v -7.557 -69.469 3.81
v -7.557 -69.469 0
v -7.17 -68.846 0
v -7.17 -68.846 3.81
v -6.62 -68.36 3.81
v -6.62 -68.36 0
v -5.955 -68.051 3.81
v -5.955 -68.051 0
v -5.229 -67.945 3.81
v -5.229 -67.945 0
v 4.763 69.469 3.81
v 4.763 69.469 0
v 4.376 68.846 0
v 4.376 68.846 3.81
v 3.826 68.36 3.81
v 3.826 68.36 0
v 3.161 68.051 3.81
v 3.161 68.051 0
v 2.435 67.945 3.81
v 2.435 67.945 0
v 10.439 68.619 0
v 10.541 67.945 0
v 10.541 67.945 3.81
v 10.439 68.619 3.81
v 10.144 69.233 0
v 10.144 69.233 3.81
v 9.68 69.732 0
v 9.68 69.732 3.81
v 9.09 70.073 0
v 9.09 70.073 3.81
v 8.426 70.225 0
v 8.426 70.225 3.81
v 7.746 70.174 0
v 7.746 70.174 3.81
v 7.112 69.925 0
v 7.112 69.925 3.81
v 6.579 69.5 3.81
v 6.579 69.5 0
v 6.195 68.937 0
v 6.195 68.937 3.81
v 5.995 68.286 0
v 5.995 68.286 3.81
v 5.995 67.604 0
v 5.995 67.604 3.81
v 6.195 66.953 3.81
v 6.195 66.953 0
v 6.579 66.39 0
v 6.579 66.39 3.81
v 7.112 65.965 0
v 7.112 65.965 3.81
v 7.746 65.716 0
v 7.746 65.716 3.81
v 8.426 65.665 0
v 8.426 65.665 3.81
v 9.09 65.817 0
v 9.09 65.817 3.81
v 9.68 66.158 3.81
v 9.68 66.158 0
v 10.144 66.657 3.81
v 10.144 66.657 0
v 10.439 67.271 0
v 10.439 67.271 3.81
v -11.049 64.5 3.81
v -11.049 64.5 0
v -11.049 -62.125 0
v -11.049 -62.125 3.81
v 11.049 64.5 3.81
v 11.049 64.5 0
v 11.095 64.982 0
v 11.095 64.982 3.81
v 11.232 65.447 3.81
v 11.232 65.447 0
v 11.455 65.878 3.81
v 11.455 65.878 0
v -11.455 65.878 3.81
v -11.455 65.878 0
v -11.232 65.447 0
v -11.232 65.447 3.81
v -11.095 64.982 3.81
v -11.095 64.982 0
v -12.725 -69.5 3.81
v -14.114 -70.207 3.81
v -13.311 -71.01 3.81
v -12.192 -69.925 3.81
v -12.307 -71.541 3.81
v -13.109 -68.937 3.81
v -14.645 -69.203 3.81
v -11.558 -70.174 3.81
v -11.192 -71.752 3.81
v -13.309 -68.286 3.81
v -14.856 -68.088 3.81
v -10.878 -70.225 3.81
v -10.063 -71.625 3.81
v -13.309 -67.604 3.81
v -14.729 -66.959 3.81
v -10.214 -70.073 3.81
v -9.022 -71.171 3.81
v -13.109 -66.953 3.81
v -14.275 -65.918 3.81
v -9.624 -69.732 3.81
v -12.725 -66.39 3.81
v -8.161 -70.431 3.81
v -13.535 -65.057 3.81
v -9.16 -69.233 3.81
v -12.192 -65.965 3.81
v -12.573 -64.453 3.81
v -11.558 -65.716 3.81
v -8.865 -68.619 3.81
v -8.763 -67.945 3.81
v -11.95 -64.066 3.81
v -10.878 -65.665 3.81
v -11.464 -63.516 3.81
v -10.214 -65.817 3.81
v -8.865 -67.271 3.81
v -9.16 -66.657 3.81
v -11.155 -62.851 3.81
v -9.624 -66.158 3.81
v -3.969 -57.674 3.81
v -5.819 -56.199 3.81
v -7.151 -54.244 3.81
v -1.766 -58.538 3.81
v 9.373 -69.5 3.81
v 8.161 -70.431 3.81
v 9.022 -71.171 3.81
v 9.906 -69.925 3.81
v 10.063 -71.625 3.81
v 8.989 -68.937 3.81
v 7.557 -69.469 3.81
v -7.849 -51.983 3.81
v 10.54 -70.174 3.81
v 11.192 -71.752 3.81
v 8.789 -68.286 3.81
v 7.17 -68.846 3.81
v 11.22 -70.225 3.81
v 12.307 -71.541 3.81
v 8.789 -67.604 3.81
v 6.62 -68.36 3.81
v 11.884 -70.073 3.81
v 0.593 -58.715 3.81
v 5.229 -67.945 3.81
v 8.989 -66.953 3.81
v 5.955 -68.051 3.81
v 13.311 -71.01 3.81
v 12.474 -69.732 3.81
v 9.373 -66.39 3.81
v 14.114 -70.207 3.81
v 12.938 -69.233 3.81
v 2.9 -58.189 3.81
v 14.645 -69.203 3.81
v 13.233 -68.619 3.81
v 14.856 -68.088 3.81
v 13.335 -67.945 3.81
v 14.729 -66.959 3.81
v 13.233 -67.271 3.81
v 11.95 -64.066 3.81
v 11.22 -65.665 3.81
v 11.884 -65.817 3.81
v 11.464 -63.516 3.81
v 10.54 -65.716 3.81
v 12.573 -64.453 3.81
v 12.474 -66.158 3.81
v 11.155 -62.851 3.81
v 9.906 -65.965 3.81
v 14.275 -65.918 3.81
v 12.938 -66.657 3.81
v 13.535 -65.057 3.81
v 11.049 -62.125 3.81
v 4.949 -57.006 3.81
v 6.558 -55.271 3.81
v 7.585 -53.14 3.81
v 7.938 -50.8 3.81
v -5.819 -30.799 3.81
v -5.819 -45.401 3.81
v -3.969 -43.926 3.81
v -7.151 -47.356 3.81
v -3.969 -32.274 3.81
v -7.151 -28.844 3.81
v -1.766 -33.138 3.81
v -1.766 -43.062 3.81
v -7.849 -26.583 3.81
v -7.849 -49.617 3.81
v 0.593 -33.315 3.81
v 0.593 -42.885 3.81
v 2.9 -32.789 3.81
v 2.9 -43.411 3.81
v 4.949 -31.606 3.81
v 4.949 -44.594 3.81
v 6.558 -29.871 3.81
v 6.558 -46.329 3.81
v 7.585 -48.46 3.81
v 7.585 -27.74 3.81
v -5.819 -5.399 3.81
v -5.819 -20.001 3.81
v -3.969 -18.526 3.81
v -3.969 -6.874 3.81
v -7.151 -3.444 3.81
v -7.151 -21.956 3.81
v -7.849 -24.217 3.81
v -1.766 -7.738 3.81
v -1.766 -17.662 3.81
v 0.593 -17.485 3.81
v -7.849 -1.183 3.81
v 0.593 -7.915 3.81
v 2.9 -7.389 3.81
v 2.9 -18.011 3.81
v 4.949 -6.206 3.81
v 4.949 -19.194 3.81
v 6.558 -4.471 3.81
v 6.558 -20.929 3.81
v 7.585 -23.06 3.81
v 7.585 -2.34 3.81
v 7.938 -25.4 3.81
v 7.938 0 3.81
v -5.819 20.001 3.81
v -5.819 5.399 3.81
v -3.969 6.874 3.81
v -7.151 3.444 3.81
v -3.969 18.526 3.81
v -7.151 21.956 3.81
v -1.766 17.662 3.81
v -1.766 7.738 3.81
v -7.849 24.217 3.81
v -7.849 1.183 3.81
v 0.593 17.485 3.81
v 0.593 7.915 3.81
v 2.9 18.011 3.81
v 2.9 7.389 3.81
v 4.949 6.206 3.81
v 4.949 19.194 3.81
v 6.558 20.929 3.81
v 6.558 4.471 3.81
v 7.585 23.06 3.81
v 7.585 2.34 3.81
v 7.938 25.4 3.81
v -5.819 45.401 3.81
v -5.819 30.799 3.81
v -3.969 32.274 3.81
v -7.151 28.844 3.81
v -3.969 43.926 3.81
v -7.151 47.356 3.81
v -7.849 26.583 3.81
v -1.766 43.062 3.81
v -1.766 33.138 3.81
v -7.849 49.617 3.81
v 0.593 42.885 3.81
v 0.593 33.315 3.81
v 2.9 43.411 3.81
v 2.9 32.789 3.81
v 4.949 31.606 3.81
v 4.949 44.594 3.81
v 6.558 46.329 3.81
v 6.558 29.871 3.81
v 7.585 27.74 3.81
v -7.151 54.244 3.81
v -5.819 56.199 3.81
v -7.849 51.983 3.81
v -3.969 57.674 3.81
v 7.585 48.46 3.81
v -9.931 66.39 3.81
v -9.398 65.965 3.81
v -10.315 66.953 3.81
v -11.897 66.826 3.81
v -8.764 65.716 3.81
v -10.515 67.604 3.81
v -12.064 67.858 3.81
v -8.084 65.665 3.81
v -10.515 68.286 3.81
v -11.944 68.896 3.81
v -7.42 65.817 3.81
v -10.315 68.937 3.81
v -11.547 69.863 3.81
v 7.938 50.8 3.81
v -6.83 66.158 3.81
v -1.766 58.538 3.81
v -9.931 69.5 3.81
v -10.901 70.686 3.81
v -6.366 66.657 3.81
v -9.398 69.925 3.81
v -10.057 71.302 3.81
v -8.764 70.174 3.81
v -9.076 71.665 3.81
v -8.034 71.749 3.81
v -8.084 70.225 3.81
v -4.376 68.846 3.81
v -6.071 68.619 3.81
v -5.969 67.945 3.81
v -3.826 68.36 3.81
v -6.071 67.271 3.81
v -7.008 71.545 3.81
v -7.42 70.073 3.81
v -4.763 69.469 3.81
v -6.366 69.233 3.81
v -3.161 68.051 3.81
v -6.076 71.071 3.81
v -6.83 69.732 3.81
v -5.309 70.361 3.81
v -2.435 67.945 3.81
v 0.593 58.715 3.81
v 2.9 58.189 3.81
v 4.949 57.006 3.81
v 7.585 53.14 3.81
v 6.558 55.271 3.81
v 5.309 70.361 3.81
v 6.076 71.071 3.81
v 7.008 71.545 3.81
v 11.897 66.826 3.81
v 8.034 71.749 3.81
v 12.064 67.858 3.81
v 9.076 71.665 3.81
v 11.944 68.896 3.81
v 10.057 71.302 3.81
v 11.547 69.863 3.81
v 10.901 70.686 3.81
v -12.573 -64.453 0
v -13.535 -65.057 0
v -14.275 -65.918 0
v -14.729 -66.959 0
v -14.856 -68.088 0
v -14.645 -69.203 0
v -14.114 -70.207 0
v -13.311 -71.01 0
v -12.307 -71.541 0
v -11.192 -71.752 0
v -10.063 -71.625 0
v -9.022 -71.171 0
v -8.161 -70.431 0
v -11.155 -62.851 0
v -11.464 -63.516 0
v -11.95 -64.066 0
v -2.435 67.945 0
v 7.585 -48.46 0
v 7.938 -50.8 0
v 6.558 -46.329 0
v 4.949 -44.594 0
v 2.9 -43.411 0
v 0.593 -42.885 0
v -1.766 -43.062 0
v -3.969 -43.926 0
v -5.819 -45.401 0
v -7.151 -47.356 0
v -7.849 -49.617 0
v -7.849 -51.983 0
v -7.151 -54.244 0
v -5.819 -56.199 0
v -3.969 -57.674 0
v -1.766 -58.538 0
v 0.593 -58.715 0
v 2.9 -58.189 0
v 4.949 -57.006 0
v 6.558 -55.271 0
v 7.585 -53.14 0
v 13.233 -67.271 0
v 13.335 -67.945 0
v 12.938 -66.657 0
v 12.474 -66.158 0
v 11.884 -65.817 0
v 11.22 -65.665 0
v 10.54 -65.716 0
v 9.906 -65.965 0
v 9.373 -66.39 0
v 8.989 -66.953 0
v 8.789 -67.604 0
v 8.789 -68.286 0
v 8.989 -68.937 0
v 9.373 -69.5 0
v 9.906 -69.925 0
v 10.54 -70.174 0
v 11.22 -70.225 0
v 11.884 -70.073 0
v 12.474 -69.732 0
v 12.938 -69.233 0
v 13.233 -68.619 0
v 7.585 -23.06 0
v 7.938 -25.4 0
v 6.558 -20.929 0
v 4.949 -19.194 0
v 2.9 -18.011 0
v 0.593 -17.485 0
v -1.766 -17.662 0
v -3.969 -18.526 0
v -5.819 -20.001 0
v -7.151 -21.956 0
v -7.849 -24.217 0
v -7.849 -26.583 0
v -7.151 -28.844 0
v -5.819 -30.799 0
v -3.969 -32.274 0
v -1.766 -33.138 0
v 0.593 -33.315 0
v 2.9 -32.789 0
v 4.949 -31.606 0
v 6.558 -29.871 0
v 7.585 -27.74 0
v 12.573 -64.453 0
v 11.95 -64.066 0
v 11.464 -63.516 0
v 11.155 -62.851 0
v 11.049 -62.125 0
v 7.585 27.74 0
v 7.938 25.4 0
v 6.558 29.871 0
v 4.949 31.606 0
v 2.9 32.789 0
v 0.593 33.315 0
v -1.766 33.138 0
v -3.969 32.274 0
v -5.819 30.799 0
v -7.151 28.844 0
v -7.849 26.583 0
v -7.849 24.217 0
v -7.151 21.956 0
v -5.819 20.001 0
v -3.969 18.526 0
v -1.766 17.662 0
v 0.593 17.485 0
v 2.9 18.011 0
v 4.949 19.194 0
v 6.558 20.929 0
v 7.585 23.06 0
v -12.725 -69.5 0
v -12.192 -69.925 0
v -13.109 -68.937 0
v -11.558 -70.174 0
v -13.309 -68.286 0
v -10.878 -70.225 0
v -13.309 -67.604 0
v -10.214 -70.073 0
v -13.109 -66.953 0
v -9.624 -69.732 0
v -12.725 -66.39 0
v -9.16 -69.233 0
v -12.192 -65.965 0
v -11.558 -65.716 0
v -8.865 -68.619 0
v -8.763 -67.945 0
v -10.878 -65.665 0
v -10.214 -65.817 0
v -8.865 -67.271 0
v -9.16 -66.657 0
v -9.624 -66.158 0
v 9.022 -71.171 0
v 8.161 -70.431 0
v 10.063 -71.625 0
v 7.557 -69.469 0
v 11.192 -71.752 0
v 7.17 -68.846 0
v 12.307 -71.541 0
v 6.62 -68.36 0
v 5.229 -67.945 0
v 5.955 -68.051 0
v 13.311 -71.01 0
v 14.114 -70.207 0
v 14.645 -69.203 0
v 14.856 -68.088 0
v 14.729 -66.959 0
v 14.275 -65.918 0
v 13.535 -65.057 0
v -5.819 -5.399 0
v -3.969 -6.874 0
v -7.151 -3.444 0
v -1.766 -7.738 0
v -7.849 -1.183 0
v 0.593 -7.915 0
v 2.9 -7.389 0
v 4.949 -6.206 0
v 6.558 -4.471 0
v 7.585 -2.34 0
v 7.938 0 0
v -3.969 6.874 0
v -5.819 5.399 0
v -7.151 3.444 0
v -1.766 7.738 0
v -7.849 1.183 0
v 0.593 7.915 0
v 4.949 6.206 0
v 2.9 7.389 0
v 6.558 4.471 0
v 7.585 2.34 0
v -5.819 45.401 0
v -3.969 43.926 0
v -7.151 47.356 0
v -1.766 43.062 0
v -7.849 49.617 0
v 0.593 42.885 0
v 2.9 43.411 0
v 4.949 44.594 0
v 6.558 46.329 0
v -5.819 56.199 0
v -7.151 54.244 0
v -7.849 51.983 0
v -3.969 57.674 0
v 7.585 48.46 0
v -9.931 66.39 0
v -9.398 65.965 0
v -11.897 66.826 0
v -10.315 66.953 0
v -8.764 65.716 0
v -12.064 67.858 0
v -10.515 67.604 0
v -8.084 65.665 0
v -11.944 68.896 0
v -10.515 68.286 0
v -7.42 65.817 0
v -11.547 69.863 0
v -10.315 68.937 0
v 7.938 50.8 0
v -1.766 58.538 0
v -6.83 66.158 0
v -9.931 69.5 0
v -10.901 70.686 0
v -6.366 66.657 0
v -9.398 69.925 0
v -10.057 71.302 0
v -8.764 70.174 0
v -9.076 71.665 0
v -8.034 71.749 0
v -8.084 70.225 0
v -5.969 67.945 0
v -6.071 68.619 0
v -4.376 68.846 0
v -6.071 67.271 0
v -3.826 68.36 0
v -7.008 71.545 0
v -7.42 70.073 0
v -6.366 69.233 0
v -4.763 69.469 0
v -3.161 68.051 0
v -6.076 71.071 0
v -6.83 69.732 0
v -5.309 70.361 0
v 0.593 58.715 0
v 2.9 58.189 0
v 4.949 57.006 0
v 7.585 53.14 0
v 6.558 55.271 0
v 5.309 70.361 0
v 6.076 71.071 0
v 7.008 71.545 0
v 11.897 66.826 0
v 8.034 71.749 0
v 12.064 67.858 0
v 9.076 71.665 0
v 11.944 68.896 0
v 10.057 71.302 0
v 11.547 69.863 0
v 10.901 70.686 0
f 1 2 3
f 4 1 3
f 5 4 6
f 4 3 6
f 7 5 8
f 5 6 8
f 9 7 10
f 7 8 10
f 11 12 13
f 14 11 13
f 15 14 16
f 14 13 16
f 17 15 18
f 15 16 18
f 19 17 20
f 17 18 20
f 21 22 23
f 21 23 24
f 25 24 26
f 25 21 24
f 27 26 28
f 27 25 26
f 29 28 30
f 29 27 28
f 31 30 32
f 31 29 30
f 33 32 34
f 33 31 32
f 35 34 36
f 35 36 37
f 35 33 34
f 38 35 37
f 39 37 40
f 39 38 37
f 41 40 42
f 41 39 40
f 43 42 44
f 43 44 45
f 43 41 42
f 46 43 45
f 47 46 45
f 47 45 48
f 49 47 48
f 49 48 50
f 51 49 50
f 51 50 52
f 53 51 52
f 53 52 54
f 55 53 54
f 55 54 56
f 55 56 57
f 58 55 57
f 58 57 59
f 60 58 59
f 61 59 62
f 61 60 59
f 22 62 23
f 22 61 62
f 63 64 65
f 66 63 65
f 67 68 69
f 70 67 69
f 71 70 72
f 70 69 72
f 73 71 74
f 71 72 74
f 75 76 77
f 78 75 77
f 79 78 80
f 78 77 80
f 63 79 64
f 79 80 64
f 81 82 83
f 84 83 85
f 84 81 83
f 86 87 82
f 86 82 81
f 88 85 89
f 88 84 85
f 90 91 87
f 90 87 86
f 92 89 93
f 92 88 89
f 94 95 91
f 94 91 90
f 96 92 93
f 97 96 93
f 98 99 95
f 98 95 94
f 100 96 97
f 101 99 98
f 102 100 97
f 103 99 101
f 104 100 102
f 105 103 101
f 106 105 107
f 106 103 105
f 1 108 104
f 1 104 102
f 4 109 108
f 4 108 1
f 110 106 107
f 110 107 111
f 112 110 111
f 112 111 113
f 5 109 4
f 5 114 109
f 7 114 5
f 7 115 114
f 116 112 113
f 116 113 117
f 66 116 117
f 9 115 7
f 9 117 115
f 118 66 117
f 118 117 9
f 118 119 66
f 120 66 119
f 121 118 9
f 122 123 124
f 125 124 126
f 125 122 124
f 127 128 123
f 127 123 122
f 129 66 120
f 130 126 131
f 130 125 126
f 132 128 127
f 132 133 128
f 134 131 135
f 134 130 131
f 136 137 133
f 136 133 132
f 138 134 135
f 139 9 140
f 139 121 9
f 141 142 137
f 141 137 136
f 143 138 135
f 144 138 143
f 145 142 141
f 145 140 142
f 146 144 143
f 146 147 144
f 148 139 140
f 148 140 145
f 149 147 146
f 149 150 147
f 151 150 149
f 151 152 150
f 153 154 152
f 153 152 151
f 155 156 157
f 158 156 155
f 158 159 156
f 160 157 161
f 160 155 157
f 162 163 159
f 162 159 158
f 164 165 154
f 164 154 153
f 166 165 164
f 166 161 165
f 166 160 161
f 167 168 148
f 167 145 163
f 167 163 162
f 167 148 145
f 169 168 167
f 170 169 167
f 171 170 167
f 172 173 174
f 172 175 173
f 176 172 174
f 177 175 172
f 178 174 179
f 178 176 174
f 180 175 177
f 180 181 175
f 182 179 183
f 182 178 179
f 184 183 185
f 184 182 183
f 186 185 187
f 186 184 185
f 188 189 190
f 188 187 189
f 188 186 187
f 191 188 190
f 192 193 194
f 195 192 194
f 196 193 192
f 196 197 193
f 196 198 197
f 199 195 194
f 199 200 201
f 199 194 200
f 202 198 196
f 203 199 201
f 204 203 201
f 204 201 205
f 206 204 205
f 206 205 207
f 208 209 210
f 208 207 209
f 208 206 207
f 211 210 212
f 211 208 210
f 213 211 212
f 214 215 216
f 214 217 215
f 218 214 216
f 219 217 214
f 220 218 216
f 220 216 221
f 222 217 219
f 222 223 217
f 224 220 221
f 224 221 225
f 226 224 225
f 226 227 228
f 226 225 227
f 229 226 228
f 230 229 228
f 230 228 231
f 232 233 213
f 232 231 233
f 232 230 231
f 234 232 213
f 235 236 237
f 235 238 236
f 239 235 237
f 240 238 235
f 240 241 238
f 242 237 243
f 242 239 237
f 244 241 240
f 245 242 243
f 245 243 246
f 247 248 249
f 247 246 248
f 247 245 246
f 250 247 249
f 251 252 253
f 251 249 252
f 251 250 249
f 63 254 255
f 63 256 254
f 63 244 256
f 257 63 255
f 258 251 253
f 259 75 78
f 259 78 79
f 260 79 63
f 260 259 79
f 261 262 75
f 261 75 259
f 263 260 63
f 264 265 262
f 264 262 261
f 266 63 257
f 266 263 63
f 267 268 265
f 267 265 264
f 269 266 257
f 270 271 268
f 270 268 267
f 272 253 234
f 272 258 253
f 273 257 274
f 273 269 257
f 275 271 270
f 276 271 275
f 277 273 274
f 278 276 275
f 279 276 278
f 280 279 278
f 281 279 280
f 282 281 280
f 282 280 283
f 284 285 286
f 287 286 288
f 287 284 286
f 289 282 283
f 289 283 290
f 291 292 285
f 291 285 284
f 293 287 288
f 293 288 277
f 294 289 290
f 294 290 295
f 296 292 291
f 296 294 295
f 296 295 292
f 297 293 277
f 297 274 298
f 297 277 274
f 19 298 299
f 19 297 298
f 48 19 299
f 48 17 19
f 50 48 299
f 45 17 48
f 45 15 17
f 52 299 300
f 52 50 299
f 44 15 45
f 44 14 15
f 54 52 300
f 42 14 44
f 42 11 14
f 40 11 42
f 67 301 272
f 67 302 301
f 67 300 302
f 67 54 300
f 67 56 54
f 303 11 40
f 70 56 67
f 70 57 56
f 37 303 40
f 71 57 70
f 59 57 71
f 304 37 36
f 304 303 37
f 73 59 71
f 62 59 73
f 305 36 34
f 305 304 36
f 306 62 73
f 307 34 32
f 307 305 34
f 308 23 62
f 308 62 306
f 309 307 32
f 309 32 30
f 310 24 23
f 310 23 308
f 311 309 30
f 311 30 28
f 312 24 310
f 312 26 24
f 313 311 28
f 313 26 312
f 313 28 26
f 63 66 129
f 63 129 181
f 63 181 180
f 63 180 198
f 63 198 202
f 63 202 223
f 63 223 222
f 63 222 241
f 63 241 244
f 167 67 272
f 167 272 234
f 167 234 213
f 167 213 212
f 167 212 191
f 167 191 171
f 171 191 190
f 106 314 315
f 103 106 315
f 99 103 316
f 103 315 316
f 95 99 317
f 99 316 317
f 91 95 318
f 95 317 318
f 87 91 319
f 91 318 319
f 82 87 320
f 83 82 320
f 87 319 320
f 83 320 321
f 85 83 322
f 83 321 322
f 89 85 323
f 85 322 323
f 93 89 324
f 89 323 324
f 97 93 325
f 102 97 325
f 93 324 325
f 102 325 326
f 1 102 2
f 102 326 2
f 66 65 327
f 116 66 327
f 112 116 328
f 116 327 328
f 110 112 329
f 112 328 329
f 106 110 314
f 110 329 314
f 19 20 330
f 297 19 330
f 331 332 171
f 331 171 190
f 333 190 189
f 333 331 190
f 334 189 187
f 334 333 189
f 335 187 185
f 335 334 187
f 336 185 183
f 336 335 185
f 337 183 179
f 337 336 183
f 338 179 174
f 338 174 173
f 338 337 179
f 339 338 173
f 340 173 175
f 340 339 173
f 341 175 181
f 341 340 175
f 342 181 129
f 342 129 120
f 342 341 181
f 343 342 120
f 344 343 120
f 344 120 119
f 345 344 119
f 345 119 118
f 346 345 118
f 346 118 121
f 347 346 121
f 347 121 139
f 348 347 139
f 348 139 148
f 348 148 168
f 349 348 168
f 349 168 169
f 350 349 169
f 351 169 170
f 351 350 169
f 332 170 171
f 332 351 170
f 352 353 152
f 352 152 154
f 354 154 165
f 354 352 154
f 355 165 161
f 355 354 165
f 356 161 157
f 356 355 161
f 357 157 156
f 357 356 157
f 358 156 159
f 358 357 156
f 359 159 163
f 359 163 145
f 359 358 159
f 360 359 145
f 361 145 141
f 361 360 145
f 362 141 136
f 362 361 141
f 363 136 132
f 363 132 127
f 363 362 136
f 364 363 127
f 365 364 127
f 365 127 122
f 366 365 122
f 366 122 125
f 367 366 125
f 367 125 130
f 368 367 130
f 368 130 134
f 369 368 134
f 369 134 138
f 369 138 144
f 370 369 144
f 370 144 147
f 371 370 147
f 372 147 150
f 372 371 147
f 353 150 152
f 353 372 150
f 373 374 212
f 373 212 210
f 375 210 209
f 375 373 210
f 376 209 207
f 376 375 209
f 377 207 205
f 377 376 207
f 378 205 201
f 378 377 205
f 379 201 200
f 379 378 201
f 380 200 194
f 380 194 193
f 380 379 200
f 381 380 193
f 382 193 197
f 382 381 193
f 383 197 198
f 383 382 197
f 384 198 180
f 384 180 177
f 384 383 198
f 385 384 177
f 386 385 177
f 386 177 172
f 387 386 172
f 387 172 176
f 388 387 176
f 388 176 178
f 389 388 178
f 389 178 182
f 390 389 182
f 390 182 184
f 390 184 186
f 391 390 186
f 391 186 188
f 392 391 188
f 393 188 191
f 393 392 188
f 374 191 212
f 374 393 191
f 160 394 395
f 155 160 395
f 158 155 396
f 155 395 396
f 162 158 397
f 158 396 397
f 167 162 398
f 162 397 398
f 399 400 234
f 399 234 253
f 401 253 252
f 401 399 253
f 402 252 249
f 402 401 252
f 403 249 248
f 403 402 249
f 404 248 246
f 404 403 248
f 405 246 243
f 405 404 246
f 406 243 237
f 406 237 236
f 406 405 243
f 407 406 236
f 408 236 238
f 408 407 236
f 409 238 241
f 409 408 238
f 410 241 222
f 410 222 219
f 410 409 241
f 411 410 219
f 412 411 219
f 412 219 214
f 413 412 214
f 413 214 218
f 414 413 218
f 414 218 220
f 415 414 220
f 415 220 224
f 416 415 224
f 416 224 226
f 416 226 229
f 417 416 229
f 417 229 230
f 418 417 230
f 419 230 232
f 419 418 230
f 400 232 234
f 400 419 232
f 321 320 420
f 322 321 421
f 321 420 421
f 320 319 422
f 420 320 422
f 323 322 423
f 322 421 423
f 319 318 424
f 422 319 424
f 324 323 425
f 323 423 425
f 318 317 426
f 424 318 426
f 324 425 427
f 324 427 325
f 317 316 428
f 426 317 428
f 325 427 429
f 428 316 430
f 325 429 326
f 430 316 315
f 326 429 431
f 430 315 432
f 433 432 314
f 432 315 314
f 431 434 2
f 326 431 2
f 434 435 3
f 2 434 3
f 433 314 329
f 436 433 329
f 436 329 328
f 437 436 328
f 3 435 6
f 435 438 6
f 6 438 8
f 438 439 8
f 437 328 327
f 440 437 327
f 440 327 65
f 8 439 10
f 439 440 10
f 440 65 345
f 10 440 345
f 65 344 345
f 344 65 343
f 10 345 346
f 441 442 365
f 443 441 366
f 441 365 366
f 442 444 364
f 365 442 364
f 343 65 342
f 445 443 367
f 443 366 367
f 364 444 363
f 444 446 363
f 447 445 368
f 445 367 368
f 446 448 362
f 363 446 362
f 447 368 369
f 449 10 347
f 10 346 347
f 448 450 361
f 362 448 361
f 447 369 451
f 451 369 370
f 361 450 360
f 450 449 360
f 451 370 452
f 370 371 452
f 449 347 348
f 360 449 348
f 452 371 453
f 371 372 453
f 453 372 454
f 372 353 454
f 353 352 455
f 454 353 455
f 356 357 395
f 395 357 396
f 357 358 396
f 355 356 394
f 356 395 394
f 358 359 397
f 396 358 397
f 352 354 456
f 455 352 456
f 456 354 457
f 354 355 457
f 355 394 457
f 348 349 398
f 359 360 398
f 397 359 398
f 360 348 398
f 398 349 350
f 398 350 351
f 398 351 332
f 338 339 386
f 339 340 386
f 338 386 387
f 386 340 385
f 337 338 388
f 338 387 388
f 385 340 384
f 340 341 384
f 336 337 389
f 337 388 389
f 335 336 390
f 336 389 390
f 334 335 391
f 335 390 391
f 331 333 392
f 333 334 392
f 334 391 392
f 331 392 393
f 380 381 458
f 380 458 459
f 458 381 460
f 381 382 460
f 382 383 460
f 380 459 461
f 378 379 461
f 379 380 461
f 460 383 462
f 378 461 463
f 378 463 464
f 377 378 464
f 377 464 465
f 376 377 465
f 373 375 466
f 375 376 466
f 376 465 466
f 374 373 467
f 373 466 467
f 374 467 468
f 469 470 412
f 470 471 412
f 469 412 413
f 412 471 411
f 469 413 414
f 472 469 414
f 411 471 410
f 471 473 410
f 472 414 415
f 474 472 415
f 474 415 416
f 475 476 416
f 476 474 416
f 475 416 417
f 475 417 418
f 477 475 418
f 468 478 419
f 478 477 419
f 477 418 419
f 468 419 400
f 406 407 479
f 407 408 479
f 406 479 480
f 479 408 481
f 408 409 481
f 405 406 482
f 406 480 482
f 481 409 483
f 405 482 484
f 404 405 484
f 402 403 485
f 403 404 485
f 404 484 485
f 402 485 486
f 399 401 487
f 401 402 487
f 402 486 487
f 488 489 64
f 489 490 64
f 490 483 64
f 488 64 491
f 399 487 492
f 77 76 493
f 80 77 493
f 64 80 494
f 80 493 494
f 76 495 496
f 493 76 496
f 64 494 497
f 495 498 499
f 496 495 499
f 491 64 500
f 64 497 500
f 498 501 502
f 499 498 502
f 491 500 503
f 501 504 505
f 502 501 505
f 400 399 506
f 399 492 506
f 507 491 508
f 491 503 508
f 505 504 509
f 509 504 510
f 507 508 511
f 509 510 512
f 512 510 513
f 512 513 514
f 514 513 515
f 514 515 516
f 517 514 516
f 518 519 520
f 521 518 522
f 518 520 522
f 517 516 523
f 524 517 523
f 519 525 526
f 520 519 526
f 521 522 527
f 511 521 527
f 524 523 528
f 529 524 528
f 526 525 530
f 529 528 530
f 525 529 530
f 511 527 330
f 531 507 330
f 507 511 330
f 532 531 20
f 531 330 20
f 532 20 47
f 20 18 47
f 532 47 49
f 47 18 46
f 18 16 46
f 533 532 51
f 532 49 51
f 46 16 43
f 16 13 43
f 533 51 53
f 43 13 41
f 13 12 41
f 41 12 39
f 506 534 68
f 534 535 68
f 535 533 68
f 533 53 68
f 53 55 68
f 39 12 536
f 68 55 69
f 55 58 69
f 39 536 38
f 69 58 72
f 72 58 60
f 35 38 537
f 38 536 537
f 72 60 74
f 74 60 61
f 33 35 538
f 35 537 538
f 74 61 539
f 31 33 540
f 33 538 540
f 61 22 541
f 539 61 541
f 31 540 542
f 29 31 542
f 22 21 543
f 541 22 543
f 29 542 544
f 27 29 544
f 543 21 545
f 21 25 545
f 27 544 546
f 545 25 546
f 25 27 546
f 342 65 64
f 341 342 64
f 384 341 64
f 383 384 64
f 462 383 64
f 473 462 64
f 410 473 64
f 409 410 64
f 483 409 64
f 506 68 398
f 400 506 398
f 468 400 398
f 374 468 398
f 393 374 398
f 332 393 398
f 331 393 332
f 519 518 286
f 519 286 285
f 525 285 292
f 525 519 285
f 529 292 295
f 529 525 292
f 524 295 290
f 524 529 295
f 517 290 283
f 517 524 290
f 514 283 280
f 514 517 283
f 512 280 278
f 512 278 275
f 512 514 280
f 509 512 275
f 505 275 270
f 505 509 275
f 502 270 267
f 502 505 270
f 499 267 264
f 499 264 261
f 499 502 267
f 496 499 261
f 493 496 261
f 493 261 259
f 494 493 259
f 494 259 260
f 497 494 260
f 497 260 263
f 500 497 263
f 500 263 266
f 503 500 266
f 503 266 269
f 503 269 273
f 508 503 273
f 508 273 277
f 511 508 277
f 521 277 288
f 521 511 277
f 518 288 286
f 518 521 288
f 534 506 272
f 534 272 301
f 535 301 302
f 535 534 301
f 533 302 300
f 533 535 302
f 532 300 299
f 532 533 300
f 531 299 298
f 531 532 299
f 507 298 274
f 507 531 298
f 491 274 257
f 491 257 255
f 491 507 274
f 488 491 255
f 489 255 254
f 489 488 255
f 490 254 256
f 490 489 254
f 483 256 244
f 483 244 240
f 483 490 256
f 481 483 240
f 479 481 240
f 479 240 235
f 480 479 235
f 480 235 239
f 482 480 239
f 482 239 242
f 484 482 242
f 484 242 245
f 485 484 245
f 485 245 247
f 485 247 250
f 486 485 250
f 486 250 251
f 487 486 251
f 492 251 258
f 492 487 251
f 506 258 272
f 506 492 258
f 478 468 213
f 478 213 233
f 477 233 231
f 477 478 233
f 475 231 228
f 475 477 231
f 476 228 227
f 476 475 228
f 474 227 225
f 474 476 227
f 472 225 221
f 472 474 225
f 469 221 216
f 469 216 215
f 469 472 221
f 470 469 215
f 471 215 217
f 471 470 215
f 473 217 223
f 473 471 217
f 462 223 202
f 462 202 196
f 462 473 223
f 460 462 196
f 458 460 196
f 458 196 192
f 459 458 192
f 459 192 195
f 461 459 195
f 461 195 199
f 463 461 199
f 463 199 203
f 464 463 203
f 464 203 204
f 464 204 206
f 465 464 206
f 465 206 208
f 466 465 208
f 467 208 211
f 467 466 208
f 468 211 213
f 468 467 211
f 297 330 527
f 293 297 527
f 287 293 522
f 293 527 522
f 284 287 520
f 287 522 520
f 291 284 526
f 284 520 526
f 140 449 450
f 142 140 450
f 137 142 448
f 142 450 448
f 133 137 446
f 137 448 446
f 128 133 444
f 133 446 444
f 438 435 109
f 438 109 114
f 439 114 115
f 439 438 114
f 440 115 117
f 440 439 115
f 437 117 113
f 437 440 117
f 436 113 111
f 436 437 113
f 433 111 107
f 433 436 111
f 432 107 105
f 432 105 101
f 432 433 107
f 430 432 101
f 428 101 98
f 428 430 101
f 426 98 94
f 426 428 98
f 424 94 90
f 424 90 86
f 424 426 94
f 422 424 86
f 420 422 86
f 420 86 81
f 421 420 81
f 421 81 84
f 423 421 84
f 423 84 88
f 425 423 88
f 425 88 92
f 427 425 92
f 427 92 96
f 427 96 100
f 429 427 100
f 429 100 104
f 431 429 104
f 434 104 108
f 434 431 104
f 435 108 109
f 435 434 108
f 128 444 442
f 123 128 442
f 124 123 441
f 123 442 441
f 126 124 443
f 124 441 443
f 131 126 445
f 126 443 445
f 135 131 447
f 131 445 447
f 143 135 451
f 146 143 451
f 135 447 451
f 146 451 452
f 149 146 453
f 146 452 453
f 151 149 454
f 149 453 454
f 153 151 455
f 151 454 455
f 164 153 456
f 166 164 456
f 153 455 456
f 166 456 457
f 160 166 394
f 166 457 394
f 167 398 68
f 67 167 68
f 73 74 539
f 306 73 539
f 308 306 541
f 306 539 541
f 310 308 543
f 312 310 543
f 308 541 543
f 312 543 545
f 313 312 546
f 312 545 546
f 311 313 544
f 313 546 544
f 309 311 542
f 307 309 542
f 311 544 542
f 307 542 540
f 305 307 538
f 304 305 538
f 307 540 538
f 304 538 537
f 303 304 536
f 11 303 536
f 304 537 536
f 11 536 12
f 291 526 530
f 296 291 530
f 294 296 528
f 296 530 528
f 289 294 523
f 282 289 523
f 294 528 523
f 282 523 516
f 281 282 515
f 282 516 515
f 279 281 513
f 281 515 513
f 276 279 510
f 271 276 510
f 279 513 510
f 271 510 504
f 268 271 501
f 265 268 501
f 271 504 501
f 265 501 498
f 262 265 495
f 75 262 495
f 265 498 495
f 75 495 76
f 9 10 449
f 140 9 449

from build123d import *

# Parameters (mm, degrees)
F0_R     = 2.286
F0_R_2   = 7.9375
F1_DEPTH = 3.81


with BuildPart() as f1:
    # F0 (on Top) → F1 (new body)
    with BuildSketch(Plane.XY):
        with BuildLine():
            Line((2.435129, 67.945), (-2.435129, 67.945))
            ThreePointArc((-2.435129, 67.945), (-3.826344, 68.359884), (-4.763077, 69.469))
            ThreePointArc((-4.763077, 69.469), (-10.056534, 71.302168), (-11.4554, 65.877746))
            ThreePointArc((-11.4554, 65.877746), (-11.152718, 65.217997), (-11.049, 64.499576))
            Line((-11.049, 64.499576), (-11.049, -62.125129))
            ThreePointArc((-11.049, -62.125129), (-11.463884, -63.516344), (-12.573, -64.453077))
            ThreePointArc((-12.573, -64.453077), (-13.743077, -70.639077), (-7.557077, -69.469))
            ThreePointArc((-7.557077, -69.469), (-6.620344, -68.359884), (-5.229129, -67.945))
            Line((-5.229129, -67.945), (5.229129, -67.945))
            ThreePointArc((5.229129, -67.945), (6.620344, -68.359884), (7.557077, -69.469))
            ThreePointArc((7.557077, -69.469), (13.743077, -70.639077), (12.573, -64.453077))
            ThreePointArc((12.573, -64.453077), (11.463884, -63.516344), (11.049, -62.125129))
            Line((11.049, -62.125129), (11.049, 64.499576))
            ThreePointArc((11.049, 64.499576), (11.152718, 65.217997), (11.4554, 65.877746))
            ThreePointArc((11.4554, 65.877746), (10.056534, 71.302168), (4.763077, 69.469))
            ThreePointArc((4.763077, 69.469), (3.826344, 68.359884), (2.435129, 67.945))
        make_face()
        with Locations((-11.049, -67.945)):
            Circle(F0_R, mode=Mode.SUBTRACT)
        with Locations((0, -50.8)):
            Circle(F0_R_2, mode=Mode.SUBTRACT)
        with Locations((0, -25.4)):
            Circle(F0_R_2, mode=Mode.SUBTRACT)
        with Locations((11.049, -67.945)):
            Circle(F0_R, mode=Mode.SUBTRACT)
        Circle(F0_R_2, mode=Mode.SUBTRACT)
        with Locations((0, 25.4)):
            Circle(F0_R_2, mode=Mode.SUBTRACT)
        with Locations((-8.255, 67.945)):
            Circle(F0_R, mode=Mode.SUBTRACT)
        with Locations((0, 50.8)):
            Circle(F0_R_2, mode=Mode.SUBTRACT)
        with Locations((8.255, 67.945)):
            Circle(F0_R, mode=Mode.SUBTRACT)
    extrude(amount=F1_DEPTH)


solid = f1.part
